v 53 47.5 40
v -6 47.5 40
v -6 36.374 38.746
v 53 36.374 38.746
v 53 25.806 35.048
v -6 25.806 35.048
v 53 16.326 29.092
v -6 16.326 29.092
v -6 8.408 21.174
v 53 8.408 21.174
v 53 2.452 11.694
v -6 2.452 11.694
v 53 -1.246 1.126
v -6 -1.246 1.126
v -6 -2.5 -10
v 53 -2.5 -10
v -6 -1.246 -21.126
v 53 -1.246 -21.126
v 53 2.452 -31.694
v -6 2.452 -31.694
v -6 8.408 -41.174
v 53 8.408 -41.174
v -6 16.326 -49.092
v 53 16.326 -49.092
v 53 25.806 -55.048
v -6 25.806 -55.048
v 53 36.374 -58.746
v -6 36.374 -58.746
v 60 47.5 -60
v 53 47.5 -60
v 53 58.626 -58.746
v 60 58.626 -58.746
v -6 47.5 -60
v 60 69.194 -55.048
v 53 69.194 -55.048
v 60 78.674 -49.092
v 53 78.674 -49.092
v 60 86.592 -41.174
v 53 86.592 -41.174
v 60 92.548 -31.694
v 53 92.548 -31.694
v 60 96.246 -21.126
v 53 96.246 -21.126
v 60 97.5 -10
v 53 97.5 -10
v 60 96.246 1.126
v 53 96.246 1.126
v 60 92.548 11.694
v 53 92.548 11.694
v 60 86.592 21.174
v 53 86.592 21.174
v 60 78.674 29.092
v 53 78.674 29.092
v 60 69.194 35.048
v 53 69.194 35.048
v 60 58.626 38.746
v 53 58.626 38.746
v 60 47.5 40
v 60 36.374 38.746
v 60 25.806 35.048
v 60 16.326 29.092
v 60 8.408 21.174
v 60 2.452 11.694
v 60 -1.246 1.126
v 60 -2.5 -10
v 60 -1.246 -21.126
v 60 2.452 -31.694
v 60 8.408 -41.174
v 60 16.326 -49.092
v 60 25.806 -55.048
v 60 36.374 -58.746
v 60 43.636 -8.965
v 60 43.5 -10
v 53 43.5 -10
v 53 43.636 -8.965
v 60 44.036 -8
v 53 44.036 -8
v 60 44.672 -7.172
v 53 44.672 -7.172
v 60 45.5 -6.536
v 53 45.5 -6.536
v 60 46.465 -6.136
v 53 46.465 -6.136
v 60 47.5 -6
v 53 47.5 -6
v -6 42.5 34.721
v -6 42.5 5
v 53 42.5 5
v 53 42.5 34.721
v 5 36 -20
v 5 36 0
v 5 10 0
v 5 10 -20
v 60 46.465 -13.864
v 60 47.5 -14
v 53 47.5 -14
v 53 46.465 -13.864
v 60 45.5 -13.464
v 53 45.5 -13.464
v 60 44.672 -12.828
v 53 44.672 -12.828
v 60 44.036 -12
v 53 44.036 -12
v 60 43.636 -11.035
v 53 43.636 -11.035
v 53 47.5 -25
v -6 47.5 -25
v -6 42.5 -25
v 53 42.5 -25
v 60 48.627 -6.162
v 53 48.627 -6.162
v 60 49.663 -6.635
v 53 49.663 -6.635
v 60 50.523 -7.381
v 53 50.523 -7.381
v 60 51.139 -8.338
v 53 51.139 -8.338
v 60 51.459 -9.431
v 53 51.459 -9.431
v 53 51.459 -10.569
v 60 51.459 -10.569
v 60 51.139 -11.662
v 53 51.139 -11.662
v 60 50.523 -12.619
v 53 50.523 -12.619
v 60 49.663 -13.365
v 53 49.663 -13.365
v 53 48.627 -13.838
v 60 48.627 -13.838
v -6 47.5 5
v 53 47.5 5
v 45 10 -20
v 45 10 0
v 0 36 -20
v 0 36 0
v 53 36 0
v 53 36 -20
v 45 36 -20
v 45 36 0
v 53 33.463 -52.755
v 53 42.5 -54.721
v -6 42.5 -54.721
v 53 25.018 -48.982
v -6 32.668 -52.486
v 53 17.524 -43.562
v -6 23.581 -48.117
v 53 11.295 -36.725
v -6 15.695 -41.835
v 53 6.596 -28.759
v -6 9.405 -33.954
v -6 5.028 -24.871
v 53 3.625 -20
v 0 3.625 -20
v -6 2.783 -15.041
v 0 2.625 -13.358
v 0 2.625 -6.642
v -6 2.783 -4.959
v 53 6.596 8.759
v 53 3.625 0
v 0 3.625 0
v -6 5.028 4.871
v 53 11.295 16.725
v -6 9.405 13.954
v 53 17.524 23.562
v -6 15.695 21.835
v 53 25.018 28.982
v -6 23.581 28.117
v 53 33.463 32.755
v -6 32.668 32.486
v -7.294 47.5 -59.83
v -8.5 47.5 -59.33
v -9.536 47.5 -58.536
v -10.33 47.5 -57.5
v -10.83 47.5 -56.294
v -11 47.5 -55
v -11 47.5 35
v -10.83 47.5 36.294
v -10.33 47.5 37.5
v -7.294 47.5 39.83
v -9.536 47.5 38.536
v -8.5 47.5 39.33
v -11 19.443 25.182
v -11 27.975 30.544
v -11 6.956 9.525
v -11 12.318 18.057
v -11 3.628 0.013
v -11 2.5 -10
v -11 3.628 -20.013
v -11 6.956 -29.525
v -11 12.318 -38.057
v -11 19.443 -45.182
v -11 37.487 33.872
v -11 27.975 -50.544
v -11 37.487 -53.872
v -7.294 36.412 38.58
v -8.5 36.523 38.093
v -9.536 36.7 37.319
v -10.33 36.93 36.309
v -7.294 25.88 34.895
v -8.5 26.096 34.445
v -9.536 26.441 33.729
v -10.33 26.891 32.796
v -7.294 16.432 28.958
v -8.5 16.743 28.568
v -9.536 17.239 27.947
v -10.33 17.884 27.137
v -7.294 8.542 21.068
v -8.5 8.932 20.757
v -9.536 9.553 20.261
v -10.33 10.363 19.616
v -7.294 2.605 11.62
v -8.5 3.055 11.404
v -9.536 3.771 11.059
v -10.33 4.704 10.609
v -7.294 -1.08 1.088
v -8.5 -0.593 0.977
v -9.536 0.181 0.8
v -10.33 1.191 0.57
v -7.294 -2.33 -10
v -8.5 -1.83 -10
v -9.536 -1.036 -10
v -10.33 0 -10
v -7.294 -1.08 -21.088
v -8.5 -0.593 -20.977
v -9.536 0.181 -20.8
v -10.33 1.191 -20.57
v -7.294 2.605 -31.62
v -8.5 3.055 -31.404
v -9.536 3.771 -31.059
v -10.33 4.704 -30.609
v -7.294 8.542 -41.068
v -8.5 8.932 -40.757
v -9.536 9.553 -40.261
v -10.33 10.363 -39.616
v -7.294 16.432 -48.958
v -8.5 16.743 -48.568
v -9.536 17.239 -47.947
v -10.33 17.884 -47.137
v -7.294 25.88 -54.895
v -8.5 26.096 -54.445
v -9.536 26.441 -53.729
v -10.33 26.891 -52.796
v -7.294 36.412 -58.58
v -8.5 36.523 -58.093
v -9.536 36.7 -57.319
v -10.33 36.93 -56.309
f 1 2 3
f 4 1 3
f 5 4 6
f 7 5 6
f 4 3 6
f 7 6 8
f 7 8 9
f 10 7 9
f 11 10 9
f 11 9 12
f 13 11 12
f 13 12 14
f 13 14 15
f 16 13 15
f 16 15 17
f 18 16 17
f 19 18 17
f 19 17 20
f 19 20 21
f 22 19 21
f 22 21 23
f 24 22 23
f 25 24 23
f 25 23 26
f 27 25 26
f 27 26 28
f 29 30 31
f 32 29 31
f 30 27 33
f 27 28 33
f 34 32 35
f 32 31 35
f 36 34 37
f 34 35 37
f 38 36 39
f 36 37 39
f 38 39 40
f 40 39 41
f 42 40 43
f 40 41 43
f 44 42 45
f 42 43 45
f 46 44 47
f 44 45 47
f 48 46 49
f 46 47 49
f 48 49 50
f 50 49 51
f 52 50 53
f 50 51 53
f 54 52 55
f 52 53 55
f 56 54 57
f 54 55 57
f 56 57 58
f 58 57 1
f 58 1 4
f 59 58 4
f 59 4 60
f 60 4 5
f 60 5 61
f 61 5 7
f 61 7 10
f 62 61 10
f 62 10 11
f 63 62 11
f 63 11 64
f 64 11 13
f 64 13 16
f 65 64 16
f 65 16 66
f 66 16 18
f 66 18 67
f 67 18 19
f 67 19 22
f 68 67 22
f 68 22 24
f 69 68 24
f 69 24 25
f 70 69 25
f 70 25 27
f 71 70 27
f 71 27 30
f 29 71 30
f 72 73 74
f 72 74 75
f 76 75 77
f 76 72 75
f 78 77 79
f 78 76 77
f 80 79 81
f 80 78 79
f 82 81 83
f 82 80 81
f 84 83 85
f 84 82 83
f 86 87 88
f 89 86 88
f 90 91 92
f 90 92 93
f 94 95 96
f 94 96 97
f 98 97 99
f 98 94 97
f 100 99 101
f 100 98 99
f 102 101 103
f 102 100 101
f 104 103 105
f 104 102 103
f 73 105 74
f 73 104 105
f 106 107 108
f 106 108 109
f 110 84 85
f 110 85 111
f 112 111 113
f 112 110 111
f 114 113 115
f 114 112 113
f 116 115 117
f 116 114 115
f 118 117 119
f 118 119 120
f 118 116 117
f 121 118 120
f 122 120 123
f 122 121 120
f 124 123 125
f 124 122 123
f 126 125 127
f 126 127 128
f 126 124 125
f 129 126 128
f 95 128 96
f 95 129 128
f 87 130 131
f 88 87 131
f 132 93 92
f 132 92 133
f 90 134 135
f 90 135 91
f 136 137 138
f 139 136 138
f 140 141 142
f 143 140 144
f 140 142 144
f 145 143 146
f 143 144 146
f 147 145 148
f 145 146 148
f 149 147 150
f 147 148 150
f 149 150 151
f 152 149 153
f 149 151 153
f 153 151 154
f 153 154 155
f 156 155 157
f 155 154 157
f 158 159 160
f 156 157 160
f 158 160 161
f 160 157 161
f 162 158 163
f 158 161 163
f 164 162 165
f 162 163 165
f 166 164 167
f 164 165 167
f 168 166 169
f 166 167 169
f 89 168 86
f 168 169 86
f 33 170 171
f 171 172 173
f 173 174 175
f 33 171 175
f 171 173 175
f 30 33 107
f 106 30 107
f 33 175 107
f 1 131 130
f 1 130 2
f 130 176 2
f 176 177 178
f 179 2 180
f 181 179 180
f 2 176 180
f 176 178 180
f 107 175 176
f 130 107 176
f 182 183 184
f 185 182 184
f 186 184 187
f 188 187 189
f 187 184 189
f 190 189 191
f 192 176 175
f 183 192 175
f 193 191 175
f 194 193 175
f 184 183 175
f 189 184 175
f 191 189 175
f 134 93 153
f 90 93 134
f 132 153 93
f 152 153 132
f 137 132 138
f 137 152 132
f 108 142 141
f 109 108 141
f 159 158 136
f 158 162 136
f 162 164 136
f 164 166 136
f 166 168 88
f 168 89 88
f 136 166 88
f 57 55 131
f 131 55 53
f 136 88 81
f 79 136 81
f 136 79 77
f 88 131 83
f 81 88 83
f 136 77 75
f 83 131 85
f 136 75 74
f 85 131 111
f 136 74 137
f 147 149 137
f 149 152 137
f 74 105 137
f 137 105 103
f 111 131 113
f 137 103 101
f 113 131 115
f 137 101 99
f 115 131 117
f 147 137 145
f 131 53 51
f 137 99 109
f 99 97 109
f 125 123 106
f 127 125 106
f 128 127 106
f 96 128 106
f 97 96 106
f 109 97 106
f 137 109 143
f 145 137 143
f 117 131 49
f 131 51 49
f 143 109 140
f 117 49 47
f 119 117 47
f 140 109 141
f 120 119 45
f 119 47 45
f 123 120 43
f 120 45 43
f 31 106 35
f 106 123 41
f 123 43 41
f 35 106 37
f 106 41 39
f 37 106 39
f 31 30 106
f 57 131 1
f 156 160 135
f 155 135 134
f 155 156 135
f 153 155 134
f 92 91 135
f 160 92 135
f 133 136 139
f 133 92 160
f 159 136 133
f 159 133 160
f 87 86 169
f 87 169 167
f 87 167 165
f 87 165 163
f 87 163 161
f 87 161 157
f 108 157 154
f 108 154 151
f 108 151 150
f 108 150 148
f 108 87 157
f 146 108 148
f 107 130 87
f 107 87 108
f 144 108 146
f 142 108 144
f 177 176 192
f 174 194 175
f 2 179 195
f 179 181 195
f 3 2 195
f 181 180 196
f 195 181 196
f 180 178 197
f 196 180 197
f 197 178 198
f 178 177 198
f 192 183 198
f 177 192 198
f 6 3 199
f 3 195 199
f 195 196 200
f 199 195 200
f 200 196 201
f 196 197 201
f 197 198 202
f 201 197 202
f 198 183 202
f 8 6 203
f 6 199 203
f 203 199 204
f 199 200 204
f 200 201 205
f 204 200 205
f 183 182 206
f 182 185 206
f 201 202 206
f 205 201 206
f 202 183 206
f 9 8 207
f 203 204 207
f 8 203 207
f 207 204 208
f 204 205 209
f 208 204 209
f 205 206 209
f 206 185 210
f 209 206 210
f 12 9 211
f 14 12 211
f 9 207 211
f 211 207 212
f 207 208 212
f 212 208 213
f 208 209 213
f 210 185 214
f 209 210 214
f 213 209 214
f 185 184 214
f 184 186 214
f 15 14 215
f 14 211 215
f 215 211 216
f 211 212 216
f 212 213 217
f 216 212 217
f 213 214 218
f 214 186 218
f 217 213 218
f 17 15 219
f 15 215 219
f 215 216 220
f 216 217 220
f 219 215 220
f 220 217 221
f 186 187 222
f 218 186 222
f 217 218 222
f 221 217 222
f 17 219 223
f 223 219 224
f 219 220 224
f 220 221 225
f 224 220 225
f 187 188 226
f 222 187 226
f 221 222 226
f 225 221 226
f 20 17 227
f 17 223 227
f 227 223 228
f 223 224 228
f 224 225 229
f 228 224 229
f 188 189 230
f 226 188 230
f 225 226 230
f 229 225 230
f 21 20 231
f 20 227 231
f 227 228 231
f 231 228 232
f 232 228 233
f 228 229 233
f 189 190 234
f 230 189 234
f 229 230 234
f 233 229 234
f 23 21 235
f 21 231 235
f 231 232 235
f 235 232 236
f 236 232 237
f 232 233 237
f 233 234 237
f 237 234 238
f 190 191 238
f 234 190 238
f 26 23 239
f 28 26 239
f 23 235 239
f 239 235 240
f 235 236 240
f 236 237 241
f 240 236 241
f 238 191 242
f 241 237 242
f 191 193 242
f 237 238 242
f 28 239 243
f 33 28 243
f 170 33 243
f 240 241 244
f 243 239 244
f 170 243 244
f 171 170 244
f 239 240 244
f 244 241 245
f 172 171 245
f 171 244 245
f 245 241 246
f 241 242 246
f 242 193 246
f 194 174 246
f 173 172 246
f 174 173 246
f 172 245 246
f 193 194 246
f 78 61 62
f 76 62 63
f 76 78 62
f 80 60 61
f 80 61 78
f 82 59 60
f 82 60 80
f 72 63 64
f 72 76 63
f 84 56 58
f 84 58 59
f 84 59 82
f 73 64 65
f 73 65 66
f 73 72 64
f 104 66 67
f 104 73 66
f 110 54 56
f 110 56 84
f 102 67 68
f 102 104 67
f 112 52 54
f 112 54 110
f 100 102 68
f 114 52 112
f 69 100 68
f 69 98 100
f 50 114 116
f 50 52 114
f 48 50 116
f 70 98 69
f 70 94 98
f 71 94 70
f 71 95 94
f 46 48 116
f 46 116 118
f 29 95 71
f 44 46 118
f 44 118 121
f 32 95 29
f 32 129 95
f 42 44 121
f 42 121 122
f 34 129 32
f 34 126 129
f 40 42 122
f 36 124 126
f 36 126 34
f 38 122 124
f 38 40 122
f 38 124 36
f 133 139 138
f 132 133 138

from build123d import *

# Parameters (mm, degrees)
SKETCH1_W           = 50
SKETCH1_H           = 20
BOSS_EXTRUDE1_DEPTH = 10
SKETCH3_W           = 5
SKETCH3_H           = 20
BOSS_EXTRUDE2_DEPTH = 26
SKETCH4_W           = 15
SKETCH4_H           = 36
BOSS_EXTRUDE3_DEPTH = 20
BOSS_EXTRUDE4_DEPTH = 7
BOSS_EXTRUDE5_START = -7
SKETCH6_R           = 50
SKETCH6_R_2         = 4
BOSS_EXTRUDE5_DEPTH = 7
BOSS_EXTRUDE6_START = 64
BOSS_EXTRUDE6_DEPTH = 64
BOSS_EXTRUDE7_DEPTH = 5
FILLET1_R           = 5
SKETCH9_W           = 59
SKETCH9_H           = 30
BOSS_EXTRUDE8_DEPTH = 5


with BuildPart() as part:
    # Sketch1 → Boss-Extrude1 (new body)
    with BuildSketch(Plane(origin=(0, 0, 0), x_dir=(1, 0, 0), z_dir=(0, 1, 0))):
        with Locations((25, 10)):
            Rectangle(SKETCH1_W, SKETCH1_H)
    extrude(amount=BOSS_EXTRUDE1_DEPTH)

    # Sketch3 → Boss-Extrude2 (add)
    with BuildSketch(Plane(origin=(0, 10, 0), x_dir=(1, 0, 0), z_dir=(0, 1, 0))):
        with Locations((2.5, 10)):
            Rectangle(SKETCH3_W, SKETCH3_H)
        with Locations((47.5, 10)):
            Rectangle(SKETCH3_W, SKETCH3_H)
    extrude(amount=BOSS_EXTRUDE2_DEPTH)

    # Sketch4 → Boss-Extrude3 (add)
    with BuildSketch(Plane(origin=(0, 0, -20), x_dir=(-1, 0, 0), z_dir=(0, 0, -1))):
        with Locations((-52.5, 18)):
            Rectangle(SKETCH4_W, SKETCH4_H)
    extrude(amount=-BOSS_EXTRUDE3_DEPTH)

    # Sketch5 → Boss-Extrude4 (add)
    with BuildSketch(Plane(origin=(60, 0, 0), x_dir=(0, 0, -1), z_dir=(1, 0, 0))):
        with BuildLine():
            Line((10, 37.5), (10, 36))
            Line((10, 36), (20, 36))
            Line((20, 36), (20, 47.5))
            ThreePointArc((20, 47.5), (17.071067812, 40.428932188), (10, 37.5))
        make_face()
        with BuildLine():
            ThreePointArc((0, 47.5), (2.928932188, 40.428932188), (10, 37.5))
            Line((10, 37.5), (10, 43.5))
            ThreePointArc((10, 43.5), (7.171572875, 44.671572875), (6, 47.5))
            Line((6, 47.5), (0, 47.5))
        make_face()
        with BuildLine():
            Line((10, 43.5), (10, 37.5))
            ThreePointArc((10, 37.5), (17.071067812, 40.428932188), (20, 47.5))
            Line((20, 47.5), (14, 47.5))
            ThreePointArc((14, 47.5), (12.828427125, 44.671572875), (10, 43.5))
        make_face()
        with BuildLine():
            Line((0, 36), (10, 36))
            Line((10, 36), (10, 37.5))
            ThreePointArc((10, 37.5), (2.928932188, 40.428932188), (0, 47.5))
            Line((0, 47.5), (0, 36))
        make_face()
        with BuildLine():
            ThreePointArc((20, 47.5), (10, 57.5), (0, 47.5))
            Line((0, 47.5), (6, 47.5))
            ThreePointArc((6, 47.5), (10, 51.5), (14, 47.5))
            Line((14, 47.5), (20, 47.5))
        make_face()
    extrude(amount=-BOSS_EXTRUDE4_DEPTH)

    # Sketch6 → Boss-Extrude5 (add)
    with BuildSketch(Plane(origin=(60, 0, 0), x_dir=(0, 0, -1), z_dir=(1, 0, 0)).offset(BOSS_EXTRUDE5_START)):
        with Locations((10, 47.5)):
            Circle(SKETCH6_R)
        with Locations((10, 47.5)):
            Circle(SKETCH6_R_2, mode=Mode.SUBTRACT)
    extrude(amount=BOSS_EXTRUDE5_DEPTH)

    # Sketch7 → Boss-Extrude6 (add)
    with BuildSketch(Plane.ZY.offset(-53).offset(BOSS_EXTRUDE6_START)):
        with BuildLine():
            Line((-60, 47.5), (-55, 47.5))
            ThreePointArc((-55, 47.5), (-10, 2.5), (35, 47.5))
            Line((35, 47.5), (40, 47.5))
            ThreePointArc((40, 47.5), (-10, -2.5), (-60, 47.5))
        make_face()
    extrude(amount=-BOSS_EXTRUDE6_DEPTH)

    # Sketch8 → Boss-Extrude7 (add)
    with BuildSketch(Plane.ZY.offset(11)):
        with BuildLine():
            Line((-55, 47.5), (35, 47.5))
            ThreePointArc((35, 47.5), (-10, 2.5), (-55, 47.5))
        make_face()
    extrude(amount=-BOSS_EXTRUDE7_DEPTH)

    # Fillet1
    fillet1_edges = [part.edges().sort_by_distance(p)[0] for p in [
        (-11, -2.5, -10),
    ]]
    fillet(fillet1_edges, radius=FILLET1_R)

    # Sketch9 → Boss-Extrude8 (add)
    with BuildSketch(Plane(origin=(0, 47.5, 0), x_dir=(1, 0, 0), z_dir=(0, 1, 0))):
        with Locations((23.5, 40)):
            Rectangle(SKETCH9_W, SKETCH9_H)
        with Locations((23.5, -20)):
            Rectangle(SKETCH9_W, SKETCH9_H)
    extrude(amount=-BOSS_EXTRUDE8_DEPTH)


solid = part.part
